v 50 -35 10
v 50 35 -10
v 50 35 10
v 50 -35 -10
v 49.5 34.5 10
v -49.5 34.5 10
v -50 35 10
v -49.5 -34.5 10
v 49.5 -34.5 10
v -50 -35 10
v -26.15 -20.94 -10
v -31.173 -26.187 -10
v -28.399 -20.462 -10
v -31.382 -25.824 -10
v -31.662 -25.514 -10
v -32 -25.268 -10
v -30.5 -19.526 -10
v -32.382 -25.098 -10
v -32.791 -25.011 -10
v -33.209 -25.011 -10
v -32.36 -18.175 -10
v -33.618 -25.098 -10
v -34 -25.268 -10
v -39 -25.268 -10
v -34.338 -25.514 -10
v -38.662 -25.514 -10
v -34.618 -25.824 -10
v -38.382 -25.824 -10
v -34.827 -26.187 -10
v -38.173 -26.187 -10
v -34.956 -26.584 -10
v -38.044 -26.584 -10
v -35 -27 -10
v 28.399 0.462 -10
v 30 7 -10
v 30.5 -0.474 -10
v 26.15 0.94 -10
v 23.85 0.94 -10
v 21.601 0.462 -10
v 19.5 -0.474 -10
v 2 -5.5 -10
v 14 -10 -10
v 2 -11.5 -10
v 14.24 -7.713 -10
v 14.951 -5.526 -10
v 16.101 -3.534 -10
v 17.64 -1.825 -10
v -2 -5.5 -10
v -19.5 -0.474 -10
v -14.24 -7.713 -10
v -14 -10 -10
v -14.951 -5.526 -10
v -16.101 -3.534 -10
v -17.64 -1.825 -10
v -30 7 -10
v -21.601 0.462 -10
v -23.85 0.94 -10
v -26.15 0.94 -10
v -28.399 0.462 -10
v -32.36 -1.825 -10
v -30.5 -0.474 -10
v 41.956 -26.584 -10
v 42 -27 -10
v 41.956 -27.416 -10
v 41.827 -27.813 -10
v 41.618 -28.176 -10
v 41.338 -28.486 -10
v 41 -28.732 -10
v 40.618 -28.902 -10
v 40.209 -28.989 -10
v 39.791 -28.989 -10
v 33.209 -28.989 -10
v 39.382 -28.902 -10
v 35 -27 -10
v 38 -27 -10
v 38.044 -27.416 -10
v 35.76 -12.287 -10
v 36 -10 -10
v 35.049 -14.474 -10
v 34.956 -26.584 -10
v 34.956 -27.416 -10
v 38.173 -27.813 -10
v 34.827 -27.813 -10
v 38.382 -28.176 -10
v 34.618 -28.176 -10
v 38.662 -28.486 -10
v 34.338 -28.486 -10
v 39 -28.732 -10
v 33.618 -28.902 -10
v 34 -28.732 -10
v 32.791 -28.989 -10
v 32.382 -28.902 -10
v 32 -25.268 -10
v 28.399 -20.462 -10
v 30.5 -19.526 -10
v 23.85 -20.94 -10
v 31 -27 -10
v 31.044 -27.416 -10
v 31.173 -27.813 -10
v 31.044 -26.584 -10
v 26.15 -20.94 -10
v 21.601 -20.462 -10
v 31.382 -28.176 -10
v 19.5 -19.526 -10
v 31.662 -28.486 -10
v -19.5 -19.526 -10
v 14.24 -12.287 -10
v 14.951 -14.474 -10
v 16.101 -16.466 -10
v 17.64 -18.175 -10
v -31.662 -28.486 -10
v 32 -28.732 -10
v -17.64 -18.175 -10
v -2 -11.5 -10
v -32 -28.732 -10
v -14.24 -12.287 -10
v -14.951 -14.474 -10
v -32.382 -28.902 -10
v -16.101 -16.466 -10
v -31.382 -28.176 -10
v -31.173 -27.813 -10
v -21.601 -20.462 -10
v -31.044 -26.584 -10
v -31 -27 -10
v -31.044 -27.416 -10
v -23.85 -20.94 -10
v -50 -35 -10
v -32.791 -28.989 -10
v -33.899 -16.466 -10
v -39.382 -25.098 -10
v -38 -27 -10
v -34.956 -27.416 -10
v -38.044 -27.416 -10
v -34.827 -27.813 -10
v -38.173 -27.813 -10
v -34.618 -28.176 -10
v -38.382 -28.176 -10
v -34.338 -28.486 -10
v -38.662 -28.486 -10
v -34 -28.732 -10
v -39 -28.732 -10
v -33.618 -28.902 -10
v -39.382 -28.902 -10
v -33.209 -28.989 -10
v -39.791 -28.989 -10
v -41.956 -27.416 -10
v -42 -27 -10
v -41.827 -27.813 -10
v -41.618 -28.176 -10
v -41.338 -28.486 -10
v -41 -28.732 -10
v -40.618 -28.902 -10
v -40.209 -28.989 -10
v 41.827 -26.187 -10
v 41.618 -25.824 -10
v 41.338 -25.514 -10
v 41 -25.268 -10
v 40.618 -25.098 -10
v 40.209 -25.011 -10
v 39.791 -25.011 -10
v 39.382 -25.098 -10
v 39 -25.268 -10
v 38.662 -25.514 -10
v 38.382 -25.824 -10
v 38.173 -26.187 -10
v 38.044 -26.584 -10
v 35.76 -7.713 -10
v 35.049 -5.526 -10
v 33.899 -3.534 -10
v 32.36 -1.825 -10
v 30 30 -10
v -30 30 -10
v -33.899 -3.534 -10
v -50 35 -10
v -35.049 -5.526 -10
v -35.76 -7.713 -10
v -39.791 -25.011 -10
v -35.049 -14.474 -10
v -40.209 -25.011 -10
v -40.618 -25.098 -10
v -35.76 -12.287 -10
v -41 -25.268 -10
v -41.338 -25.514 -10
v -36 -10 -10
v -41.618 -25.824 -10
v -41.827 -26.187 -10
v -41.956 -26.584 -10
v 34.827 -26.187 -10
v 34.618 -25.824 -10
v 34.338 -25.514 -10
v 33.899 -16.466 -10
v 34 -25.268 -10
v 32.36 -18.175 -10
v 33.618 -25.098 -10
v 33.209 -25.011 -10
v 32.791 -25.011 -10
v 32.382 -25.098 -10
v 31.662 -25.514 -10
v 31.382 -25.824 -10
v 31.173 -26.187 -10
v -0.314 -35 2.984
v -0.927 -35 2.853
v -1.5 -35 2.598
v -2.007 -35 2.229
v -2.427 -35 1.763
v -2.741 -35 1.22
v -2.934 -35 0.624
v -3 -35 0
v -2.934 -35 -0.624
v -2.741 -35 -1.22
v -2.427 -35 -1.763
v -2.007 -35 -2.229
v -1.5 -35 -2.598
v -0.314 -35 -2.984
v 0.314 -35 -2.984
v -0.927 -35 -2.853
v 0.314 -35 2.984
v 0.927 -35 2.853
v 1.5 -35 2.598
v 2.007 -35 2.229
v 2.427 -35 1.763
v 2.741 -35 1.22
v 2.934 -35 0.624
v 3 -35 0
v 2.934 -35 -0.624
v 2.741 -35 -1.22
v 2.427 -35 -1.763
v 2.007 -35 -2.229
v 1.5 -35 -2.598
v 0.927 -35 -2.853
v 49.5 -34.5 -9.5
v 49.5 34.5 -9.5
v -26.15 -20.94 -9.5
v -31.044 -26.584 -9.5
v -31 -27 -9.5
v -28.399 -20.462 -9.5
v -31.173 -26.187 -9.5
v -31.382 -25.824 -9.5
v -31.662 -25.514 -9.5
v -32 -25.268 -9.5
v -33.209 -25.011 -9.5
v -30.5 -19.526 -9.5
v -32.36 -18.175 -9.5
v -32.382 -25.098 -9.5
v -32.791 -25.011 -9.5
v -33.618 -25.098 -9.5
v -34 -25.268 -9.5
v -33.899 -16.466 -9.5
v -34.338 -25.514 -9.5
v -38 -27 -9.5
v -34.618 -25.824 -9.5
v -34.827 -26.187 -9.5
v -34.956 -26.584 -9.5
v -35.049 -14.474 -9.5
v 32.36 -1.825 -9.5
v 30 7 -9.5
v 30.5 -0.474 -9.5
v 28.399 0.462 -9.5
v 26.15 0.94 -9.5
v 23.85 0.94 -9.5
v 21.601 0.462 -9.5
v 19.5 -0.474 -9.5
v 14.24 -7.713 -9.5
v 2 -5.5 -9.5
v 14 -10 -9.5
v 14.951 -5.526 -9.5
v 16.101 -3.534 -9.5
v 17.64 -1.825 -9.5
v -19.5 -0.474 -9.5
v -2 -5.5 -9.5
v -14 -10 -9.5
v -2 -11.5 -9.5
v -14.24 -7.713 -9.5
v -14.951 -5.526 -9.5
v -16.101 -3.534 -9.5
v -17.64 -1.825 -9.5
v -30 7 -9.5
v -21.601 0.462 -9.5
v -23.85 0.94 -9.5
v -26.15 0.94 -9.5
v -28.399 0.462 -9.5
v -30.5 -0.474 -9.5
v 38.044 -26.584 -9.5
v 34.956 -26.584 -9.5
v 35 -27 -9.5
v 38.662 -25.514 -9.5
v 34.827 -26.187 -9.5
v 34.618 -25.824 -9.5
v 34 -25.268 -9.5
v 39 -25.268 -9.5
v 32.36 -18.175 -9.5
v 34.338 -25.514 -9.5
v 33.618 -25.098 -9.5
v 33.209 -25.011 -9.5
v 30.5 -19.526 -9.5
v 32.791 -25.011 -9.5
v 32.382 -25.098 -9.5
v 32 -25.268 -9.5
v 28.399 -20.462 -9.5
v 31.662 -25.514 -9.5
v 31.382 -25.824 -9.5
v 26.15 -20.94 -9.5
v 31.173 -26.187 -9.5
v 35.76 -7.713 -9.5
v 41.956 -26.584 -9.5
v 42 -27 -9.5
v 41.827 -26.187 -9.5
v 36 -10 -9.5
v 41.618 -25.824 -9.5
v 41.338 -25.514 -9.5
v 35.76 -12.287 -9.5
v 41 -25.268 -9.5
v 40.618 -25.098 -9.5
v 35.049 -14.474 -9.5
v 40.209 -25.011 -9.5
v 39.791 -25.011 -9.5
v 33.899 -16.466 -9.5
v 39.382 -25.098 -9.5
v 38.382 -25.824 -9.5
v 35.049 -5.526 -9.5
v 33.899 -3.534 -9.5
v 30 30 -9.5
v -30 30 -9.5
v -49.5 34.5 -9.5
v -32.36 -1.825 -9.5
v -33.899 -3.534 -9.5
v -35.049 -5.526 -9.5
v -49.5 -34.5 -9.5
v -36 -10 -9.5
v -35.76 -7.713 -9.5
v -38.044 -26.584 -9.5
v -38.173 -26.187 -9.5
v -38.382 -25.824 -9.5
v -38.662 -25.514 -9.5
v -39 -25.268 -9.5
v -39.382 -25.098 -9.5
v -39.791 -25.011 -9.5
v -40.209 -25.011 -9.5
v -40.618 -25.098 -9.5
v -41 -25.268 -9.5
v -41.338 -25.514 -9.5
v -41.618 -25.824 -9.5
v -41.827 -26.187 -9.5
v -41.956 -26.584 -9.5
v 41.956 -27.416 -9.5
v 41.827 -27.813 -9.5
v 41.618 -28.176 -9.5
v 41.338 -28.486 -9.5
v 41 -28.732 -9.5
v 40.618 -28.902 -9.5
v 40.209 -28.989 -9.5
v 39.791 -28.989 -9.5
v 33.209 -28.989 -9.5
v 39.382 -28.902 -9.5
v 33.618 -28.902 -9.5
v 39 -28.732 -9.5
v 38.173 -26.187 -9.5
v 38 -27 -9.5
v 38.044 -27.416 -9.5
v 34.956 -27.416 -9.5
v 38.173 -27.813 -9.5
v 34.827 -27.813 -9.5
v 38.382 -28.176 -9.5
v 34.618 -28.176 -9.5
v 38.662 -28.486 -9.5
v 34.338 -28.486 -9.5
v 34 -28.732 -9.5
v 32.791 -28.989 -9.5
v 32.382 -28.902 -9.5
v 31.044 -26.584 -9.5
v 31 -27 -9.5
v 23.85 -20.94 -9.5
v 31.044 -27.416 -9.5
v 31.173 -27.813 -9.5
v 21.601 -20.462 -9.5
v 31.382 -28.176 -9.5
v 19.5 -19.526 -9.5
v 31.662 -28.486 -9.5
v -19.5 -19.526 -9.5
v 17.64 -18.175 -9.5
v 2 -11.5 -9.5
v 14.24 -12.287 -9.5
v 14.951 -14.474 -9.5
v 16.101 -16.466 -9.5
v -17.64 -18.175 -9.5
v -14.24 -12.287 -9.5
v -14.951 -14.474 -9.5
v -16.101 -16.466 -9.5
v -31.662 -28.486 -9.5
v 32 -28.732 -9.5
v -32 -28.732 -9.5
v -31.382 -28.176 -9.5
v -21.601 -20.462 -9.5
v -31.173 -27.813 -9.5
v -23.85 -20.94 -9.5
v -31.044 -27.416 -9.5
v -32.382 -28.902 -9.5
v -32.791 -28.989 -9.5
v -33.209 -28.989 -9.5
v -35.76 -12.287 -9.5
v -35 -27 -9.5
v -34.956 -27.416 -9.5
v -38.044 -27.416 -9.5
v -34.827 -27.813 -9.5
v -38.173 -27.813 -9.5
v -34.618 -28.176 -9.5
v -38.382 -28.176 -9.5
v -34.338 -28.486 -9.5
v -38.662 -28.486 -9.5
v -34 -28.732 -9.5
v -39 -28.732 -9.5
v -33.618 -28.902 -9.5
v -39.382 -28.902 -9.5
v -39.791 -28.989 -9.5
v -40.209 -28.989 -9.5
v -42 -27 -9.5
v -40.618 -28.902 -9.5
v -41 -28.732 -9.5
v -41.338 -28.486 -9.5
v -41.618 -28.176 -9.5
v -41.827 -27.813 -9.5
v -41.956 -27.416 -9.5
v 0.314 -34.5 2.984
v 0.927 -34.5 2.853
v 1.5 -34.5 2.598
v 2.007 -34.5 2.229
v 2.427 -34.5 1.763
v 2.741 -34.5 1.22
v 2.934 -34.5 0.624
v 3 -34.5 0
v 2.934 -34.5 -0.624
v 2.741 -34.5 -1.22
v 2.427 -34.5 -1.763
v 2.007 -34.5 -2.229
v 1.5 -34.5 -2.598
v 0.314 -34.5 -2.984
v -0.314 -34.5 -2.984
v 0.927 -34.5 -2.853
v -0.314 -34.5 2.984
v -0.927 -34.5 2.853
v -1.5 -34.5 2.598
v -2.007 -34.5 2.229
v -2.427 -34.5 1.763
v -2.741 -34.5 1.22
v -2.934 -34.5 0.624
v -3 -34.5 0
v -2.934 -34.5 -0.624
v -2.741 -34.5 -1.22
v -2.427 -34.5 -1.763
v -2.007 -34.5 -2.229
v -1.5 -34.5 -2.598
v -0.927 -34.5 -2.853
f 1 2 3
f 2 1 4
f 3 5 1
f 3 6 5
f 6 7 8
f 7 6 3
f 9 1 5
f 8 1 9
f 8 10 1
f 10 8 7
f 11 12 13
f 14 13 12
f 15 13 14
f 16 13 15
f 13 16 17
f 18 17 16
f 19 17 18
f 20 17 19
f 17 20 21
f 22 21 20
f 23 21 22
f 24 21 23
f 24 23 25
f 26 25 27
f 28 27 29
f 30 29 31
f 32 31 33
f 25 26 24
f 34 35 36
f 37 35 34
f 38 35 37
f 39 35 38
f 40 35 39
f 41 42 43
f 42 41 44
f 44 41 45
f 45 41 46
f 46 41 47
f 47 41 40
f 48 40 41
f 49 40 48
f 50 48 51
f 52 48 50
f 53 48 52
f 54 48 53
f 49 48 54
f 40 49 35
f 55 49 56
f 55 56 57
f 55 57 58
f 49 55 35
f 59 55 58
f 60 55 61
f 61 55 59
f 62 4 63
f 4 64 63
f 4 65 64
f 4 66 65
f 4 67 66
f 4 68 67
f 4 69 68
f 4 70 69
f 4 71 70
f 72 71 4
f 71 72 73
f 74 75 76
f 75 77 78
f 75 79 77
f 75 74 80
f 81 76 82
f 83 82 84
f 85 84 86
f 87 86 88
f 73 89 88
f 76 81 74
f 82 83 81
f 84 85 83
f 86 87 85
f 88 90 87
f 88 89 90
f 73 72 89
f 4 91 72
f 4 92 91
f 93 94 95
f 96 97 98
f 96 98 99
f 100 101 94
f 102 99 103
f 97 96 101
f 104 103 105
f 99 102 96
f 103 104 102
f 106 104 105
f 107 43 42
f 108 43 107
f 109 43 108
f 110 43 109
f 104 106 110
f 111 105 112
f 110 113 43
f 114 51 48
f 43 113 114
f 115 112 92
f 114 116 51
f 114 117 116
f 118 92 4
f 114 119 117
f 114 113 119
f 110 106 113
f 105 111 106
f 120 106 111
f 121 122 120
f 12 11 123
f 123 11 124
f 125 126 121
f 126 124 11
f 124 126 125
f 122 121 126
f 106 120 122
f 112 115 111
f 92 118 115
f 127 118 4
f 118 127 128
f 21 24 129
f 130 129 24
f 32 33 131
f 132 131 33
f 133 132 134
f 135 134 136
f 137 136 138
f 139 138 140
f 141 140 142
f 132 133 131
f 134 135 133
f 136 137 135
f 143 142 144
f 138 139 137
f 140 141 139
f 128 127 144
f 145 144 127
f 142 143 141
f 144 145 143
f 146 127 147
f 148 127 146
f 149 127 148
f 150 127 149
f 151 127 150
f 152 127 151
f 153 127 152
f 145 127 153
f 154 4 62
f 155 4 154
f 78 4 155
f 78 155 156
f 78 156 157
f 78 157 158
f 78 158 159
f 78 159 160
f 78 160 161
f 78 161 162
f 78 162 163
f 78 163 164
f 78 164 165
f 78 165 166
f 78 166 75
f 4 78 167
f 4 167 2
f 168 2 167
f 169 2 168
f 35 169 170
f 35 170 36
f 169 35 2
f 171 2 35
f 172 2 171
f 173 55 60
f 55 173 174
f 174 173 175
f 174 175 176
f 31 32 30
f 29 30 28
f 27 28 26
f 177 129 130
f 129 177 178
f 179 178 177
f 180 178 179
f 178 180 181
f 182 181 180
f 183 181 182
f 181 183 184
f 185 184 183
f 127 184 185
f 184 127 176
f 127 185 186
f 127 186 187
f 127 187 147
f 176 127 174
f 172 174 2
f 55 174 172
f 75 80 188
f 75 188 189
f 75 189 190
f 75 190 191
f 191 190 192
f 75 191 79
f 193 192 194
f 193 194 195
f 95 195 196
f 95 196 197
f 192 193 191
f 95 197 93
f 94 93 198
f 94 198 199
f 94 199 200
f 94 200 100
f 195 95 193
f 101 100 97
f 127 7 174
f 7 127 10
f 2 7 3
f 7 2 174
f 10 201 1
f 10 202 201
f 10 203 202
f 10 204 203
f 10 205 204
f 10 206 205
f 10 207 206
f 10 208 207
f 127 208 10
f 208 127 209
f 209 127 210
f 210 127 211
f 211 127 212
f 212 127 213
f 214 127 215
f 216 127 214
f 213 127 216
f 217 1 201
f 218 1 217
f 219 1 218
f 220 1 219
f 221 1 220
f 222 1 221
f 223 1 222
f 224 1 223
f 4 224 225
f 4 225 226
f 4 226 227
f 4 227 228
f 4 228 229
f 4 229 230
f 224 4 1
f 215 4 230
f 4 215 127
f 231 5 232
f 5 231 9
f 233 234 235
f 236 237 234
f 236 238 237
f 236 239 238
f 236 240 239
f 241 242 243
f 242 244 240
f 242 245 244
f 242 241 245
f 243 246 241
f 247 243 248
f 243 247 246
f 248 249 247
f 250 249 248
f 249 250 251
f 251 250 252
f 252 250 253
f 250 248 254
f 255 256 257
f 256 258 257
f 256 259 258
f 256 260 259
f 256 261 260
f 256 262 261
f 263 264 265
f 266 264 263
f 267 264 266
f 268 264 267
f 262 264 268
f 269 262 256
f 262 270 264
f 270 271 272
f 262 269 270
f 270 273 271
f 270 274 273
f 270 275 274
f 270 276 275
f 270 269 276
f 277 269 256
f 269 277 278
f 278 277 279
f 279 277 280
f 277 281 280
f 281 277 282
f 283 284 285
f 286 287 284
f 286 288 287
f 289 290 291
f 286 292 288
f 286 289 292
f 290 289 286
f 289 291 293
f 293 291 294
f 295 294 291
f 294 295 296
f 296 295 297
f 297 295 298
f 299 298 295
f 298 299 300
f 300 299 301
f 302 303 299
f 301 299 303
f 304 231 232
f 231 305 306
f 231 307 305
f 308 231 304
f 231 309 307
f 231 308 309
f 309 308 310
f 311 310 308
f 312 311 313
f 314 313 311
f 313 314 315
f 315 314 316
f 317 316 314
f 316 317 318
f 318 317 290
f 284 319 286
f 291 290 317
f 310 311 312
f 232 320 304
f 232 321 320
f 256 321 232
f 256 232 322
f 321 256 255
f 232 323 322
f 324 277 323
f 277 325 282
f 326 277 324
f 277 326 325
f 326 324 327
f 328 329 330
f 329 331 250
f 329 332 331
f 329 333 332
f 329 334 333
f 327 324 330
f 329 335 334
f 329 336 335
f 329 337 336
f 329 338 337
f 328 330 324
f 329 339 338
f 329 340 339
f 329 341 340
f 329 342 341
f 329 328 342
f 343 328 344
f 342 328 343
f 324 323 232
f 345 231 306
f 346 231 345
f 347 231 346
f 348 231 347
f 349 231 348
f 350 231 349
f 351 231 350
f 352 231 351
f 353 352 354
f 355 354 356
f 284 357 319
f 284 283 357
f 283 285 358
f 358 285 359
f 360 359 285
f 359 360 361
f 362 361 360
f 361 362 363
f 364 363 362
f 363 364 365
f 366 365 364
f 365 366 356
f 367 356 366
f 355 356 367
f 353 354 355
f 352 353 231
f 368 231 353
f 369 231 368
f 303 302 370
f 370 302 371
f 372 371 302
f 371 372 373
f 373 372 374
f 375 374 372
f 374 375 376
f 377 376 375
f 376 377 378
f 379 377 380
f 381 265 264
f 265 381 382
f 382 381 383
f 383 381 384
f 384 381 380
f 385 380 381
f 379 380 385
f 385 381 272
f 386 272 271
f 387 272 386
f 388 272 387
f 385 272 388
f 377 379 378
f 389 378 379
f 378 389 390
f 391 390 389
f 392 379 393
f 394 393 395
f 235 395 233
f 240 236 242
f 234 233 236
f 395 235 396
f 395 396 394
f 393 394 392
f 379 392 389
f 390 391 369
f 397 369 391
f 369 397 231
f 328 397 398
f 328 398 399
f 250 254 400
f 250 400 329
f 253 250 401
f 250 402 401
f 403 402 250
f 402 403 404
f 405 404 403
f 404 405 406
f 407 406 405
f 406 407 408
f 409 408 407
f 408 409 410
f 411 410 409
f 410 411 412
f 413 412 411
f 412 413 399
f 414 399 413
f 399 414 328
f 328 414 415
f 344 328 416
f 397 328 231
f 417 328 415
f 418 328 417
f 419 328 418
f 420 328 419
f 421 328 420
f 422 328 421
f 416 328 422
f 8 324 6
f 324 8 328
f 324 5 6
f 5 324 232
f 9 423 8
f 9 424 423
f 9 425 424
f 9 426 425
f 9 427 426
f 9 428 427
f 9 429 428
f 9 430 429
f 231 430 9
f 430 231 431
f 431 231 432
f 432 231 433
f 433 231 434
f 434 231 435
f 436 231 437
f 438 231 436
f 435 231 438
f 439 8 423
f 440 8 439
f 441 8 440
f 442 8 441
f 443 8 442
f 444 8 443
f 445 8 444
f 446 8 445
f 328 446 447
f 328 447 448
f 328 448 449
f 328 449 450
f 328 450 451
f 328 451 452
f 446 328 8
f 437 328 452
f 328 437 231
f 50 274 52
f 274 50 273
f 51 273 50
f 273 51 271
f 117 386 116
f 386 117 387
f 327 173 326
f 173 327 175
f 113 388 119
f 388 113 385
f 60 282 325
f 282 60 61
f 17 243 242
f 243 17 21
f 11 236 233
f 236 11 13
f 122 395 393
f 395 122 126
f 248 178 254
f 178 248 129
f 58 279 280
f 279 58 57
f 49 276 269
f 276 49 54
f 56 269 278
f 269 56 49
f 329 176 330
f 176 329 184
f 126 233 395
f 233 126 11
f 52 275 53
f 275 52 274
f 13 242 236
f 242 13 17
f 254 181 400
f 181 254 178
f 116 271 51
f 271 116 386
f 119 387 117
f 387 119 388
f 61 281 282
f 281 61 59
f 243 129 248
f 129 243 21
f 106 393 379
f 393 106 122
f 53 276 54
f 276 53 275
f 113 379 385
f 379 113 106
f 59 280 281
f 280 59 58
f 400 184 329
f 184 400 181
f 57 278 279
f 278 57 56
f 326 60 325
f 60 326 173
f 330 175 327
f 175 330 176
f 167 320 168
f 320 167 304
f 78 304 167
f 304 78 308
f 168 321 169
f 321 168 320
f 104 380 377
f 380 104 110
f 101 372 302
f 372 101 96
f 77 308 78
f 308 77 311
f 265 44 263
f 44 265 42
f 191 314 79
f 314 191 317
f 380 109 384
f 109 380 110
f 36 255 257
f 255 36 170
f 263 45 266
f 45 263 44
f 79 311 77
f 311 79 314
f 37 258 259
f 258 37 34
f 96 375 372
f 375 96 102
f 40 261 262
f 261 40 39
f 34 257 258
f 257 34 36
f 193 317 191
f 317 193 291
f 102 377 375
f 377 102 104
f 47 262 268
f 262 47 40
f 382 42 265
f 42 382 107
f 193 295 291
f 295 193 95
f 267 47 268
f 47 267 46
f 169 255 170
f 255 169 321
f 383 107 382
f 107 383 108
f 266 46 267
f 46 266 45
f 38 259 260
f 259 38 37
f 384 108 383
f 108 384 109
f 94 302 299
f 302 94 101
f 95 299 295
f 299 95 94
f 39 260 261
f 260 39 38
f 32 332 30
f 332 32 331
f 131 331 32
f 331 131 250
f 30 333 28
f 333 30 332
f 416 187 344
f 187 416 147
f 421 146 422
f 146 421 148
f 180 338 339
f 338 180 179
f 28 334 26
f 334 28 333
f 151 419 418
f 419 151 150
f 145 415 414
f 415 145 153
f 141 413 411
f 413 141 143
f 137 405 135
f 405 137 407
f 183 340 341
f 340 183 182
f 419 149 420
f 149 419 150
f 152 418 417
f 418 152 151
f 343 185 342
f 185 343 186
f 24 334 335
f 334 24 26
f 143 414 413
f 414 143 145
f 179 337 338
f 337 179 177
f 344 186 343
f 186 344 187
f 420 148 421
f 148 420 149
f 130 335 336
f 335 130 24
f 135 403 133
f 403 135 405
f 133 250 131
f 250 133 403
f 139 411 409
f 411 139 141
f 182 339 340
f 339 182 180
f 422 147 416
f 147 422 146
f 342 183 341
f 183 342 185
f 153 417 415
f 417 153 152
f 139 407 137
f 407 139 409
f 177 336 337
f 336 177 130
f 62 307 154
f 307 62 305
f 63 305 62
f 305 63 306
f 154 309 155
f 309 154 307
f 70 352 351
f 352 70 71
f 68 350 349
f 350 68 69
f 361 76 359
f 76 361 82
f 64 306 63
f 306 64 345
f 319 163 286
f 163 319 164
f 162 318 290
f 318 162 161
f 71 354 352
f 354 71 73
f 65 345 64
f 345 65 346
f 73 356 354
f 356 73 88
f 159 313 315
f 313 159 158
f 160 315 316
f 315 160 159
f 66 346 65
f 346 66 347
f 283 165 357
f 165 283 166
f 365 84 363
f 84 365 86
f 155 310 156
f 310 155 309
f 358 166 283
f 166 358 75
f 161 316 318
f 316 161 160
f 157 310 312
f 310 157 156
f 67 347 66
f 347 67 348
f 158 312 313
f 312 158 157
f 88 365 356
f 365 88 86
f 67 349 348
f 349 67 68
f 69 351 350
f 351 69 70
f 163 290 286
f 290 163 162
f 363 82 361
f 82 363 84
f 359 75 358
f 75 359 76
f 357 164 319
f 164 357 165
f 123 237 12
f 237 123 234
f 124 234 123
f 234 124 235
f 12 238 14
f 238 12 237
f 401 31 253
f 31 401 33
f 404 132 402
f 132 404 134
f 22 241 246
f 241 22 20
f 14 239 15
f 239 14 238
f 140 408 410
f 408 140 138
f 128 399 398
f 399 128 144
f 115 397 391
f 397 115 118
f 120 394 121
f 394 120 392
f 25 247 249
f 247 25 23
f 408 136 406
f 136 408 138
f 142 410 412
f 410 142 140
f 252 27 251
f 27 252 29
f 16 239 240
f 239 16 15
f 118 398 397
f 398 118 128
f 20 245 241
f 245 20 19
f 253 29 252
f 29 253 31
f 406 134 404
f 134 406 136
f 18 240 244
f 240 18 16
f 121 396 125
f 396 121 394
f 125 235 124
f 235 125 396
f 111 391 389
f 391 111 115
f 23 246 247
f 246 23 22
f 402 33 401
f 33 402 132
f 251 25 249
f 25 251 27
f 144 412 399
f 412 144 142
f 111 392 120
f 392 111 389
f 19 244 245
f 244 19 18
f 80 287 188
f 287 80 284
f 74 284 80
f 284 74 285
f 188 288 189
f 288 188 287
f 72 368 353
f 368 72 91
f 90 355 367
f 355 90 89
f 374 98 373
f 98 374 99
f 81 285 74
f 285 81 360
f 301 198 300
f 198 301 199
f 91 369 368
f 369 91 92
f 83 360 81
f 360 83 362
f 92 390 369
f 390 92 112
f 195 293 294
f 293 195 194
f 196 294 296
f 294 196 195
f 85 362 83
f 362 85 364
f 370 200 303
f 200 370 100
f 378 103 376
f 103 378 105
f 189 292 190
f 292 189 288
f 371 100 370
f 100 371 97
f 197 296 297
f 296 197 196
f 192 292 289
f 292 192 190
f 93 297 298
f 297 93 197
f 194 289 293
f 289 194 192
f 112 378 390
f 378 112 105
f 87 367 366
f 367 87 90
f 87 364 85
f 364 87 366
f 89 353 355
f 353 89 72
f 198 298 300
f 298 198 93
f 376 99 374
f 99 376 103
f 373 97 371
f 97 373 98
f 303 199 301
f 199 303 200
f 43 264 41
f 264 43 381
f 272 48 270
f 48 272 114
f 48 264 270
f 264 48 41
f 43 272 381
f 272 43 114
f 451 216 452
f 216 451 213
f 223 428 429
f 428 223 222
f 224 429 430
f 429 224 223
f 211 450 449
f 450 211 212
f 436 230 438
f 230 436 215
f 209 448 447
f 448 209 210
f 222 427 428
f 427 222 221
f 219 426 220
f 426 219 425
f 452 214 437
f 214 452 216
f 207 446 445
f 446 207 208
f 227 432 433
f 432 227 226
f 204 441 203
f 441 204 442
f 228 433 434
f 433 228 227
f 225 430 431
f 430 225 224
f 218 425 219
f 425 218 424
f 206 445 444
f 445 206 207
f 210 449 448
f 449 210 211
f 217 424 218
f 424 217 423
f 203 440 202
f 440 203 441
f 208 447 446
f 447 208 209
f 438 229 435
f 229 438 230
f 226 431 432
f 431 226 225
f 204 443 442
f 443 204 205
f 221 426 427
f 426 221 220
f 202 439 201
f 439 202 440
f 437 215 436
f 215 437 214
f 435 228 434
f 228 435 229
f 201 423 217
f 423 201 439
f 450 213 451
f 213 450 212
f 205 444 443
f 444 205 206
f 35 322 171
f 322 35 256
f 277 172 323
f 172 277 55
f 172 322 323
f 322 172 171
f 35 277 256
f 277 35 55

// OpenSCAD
//
// QuarkTx openScad blue print for 3D printer
// (c) 2016 Thierry Wilmot
// All measures are in millimeters
//

boxLenX = 100;
boxLenY = 70;
boxLenZ = 20;
boxThickness = 0.5;

gimballRadius = 11;

screenLenX = 60;
screenLenY = 23;

$fs = 0.01;

difference()
{
    // main cube
    cube([boxLenX,boxLenY,boxLenZ], center=true);
    translate([0,0,boxThickness])
        cube([boxLenX-2*boxThickness,boxLenY-2*boxThickness,boxLenZ], center=true);
    
    // gimbals print
    translate([-25,-10,-boxLenZ/2-boxThickness])
        cylinder(boxThickness*3, gimballRadius, gimballRadius);
    translate([25,-10,-boxLenZ/2-boxThickness])
        cylinder(boxThickness*3, gimballRadius, gimballRadius);
    
    // switches
    translate([-40,-27,-boxLenZ/2-boxThickness])
        cylinder(boxThickness*3, 2, 2);
    translate([40,-27,-boxLenZ/2-boxThickness])
        cylinder(boxThickness*3, 2, 2);
    translate([-33,-27,-boxLenZ/2-boxThickness])
        cylinder(boxThickness*3, 2, 2);
    translate([33,-27,-boxLenZ/2-boxThickness])
        cylinder(boxThickness*3, 2, 2);
    
    translate([0,-20+screenLenY/2,-boxLenZ/2+boxThickness])
        cube([4, 6, boxThickness*3], center=true);
    
    // antena print
    translate([0,-boxLenY/2+boxThickness*2,0])
        rotate([90,0,0])
            cylinder(boxThickness*3, 3, 3);
    
    // screen print
    translate([0,7+screenLenY/2,-boxLenZ/2+boxThickness])
        cube([screenLenX, screenLenY ,boxThickness*3], center=true);
};
